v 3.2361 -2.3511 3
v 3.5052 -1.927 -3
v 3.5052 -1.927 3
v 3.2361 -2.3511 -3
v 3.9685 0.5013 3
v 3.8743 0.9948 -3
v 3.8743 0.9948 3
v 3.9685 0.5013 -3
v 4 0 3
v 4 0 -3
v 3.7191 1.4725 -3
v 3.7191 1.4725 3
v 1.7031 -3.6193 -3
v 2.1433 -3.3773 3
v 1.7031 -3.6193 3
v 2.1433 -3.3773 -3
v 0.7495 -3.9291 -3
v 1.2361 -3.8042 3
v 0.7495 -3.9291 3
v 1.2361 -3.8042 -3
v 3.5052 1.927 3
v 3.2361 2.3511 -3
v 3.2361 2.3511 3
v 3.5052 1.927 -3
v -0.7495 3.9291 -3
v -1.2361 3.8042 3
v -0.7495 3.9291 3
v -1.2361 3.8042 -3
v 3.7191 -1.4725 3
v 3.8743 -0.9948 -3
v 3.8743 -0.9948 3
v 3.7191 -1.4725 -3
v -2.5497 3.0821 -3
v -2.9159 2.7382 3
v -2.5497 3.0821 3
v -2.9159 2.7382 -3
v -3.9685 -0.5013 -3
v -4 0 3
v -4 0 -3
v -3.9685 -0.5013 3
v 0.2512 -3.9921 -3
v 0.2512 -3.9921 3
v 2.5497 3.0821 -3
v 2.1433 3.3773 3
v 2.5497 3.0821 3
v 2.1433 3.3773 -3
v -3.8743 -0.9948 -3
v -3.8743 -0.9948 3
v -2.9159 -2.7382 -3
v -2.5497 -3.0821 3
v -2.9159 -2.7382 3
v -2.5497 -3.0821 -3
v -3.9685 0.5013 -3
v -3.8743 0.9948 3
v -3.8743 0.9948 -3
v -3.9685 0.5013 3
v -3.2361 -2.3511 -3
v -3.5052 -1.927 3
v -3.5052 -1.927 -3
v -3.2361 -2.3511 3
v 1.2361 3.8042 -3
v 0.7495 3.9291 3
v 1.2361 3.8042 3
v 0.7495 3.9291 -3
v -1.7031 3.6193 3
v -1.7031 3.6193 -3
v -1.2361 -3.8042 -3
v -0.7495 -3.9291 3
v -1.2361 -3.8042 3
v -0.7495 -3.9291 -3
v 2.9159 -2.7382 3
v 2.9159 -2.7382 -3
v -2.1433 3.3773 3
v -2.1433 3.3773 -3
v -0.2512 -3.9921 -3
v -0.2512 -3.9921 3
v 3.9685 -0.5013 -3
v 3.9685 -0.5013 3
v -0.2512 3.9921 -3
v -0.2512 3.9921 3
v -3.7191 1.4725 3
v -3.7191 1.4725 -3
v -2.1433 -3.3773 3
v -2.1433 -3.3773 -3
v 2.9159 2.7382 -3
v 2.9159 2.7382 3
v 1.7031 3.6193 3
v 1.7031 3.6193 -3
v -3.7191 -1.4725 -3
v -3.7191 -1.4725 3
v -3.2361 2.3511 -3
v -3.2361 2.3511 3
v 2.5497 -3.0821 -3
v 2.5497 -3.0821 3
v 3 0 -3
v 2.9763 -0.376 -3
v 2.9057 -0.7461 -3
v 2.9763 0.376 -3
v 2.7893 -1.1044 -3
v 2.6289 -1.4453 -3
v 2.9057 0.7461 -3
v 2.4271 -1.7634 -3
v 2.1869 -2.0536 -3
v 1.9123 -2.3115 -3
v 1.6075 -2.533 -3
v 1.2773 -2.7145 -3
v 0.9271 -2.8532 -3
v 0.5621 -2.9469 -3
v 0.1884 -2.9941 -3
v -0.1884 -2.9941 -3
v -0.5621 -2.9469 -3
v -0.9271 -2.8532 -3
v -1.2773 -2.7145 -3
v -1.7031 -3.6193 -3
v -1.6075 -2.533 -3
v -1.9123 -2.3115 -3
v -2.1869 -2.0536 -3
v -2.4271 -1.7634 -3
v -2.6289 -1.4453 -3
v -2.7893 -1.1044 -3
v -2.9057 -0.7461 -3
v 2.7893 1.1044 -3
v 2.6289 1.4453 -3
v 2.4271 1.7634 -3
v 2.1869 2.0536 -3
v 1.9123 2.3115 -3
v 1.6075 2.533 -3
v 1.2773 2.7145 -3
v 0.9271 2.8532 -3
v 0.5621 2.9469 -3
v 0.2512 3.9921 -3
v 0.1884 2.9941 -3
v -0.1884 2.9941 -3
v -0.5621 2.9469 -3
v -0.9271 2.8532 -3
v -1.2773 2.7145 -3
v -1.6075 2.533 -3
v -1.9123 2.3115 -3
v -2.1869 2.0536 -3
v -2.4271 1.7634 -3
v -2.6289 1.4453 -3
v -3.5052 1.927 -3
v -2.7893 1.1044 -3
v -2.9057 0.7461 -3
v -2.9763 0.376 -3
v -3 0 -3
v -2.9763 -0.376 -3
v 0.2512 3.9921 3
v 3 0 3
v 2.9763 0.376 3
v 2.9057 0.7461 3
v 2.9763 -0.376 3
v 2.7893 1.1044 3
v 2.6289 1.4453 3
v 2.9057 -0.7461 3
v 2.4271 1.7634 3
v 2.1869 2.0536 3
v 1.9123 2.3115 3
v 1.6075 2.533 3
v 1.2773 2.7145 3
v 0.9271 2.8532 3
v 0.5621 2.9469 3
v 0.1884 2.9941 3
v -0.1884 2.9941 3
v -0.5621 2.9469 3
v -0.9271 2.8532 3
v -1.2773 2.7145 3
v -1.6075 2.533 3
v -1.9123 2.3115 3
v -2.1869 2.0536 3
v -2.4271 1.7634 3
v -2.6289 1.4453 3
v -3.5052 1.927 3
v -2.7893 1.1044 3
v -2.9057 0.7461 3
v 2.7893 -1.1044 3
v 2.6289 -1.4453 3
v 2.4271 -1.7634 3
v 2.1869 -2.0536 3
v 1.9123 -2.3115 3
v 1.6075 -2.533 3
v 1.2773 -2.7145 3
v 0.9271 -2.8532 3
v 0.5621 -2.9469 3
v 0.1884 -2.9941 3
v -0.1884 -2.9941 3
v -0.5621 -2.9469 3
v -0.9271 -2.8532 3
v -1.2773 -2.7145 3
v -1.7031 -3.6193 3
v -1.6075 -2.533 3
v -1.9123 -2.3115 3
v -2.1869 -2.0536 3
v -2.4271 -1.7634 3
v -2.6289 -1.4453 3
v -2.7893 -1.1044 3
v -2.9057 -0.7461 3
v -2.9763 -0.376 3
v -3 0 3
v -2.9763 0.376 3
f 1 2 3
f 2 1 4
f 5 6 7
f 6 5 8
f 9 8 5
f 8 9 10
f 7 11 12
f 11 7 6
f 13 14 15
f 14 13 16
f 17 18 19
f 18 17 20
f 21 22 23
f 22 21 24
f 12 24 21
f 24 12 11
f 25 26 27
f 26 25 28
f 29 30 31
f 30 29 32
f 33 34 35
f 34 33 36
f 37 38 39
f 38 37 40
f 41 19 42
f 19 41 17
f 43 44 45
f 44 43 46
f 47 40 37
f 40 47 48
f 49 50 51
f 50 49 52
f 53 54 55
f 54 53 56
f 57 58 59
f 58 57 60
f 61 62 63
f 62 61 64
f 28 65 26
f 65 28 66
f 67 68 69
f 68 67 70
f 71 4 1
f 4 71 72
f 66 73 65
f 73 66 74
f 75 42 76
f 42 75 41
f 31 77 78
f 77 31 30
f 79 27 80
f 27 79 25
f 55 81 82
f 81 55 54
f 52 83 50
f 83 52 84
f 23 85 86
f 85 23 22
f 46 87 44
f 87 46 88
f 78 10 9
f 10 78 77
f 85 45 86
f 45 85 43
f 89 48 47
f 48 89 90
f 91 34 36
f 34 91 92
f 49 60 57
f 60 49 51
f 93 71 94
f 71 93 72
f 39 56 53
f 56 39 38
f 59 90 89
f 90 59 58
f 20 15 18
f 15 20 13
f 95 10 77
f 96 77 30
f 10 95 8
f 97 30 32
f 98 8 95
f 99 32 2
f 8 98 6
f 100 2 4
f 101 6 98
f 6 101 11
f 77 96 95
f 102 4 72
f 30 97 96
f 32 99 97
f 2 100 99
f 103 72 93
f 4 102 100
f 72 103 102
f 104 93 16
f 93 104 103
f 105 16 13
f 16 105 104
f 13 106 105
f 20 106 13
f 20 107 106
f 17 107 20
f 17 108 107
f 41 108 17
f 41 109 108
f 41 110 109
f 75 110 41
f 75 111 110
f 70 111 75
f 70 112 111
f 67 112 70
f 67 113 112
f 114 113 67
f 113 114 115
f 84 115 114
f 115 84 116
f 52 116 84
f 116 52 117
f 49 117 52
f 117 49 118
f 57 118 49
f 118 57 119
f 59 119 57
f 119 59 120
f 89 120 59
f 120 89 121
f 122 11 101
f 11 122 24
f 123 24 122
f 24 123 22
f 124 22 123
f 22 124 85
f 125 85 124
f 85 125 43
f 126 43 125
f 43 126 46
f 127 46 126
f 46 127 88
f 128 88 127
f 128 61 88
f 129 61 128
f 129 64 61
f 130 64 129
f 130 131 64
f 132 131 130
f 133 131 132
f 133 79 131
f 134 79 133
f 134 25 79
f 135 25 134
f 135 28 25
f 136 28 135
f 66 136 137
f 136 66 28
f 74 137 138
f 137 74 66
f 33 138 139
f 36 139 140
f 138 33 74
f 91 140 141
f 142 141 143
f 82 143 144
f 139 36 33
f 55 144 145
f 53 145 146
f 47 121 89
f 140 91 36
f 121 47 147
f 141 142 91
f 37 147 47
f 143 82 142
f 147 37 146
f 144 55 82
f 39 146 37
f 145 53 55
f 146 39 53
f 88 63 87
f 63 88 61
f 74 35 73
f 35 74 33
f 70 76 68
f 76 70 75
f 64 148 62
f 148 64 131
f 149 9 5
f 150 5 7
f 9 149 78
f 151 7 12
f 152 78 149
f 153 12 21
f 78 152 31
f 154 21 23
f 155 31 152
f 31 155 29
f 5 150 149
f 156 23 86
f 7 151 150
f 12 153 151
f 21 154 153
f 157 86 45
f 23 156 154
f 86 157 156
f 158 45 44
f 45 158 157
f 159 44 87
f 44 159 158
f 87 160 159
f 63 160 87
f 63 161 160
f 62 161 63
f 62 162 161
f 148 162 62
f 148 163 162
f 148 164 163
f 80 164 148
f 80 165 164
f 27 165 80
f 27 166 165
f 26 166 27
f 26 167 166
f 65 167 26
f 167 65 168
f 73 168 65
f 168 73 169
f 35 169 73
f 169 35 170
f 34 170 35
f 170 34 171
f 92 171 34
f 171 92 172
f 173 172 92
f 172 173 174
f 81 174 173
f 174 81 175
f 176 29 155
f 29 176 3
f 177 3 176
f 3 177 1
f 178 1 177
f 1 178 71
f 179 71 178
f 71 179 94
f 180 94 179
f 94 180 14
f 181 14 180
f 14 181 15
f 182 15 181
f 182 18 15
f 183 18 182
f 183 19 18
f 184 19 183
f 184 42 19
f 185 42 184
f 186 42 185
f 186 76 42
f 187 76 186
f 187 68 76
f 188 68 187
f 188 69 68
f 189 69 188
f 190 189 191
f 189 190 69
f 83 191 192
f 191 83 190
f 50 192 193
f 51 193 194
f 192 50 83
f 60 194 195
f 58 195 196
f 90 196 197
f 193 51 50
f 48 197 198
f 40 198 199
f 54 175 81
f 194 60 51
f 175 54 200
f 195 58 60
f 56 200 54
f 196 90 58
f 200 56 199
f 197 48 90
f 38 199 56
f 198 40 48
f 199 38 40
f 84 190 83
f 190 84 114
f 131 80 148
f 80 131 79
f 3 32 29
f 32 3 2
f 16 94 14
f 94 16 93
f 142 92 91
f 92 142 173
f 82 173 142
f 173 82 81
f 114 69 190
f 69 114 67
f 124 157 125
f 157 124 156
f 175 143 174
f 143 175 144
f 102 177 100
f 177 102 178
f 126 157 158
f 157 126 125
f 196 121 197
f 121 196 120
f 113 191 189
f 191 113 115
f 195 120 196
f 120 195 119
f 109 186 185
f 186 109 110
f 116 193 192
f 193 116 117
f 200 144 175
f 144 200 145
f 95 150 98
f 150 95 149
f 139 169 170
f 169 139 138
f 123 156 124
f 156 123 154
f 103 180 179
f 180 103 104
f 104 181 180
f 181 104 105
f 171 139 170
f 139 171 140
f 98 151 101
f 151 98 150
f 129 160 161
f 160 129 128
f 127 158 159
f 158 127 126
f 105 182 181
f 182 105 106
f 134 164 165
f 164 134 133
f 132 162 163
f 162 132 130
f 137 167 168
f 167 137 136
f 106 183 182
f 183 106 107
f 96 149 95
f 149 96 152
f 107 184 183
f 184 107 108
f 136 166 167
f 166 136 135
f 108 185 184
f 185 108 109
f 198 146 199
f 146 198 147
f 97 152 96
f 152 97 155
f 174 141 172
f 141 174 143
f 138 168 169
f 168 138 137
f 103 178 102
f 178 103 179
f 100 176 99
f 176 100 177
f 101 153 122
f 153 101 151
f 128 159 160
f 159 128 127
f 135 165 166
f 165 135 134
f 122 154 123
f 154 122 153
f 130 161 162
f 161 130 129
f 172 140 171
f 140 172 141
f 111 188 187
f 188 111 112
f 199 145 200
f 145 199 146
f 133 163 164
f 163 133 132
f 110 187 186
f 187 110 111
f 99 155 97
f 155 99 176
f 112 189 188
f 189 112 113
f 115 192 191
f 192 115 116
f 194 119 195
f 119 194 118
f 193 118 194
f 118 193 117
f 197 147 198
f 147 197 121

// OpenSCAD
$fn = 50;


difference() {
	union() {
		translate(v = [0, 0, -3.0000000000]) {
			cylinder(h = 6, r = 4.0000000000);
		}
	}
	union() {
		translate(v = [0, 0, -100.0000000000]) {
			cylinder(h = 200, r = 3.0000000000);
		}
	}
}
